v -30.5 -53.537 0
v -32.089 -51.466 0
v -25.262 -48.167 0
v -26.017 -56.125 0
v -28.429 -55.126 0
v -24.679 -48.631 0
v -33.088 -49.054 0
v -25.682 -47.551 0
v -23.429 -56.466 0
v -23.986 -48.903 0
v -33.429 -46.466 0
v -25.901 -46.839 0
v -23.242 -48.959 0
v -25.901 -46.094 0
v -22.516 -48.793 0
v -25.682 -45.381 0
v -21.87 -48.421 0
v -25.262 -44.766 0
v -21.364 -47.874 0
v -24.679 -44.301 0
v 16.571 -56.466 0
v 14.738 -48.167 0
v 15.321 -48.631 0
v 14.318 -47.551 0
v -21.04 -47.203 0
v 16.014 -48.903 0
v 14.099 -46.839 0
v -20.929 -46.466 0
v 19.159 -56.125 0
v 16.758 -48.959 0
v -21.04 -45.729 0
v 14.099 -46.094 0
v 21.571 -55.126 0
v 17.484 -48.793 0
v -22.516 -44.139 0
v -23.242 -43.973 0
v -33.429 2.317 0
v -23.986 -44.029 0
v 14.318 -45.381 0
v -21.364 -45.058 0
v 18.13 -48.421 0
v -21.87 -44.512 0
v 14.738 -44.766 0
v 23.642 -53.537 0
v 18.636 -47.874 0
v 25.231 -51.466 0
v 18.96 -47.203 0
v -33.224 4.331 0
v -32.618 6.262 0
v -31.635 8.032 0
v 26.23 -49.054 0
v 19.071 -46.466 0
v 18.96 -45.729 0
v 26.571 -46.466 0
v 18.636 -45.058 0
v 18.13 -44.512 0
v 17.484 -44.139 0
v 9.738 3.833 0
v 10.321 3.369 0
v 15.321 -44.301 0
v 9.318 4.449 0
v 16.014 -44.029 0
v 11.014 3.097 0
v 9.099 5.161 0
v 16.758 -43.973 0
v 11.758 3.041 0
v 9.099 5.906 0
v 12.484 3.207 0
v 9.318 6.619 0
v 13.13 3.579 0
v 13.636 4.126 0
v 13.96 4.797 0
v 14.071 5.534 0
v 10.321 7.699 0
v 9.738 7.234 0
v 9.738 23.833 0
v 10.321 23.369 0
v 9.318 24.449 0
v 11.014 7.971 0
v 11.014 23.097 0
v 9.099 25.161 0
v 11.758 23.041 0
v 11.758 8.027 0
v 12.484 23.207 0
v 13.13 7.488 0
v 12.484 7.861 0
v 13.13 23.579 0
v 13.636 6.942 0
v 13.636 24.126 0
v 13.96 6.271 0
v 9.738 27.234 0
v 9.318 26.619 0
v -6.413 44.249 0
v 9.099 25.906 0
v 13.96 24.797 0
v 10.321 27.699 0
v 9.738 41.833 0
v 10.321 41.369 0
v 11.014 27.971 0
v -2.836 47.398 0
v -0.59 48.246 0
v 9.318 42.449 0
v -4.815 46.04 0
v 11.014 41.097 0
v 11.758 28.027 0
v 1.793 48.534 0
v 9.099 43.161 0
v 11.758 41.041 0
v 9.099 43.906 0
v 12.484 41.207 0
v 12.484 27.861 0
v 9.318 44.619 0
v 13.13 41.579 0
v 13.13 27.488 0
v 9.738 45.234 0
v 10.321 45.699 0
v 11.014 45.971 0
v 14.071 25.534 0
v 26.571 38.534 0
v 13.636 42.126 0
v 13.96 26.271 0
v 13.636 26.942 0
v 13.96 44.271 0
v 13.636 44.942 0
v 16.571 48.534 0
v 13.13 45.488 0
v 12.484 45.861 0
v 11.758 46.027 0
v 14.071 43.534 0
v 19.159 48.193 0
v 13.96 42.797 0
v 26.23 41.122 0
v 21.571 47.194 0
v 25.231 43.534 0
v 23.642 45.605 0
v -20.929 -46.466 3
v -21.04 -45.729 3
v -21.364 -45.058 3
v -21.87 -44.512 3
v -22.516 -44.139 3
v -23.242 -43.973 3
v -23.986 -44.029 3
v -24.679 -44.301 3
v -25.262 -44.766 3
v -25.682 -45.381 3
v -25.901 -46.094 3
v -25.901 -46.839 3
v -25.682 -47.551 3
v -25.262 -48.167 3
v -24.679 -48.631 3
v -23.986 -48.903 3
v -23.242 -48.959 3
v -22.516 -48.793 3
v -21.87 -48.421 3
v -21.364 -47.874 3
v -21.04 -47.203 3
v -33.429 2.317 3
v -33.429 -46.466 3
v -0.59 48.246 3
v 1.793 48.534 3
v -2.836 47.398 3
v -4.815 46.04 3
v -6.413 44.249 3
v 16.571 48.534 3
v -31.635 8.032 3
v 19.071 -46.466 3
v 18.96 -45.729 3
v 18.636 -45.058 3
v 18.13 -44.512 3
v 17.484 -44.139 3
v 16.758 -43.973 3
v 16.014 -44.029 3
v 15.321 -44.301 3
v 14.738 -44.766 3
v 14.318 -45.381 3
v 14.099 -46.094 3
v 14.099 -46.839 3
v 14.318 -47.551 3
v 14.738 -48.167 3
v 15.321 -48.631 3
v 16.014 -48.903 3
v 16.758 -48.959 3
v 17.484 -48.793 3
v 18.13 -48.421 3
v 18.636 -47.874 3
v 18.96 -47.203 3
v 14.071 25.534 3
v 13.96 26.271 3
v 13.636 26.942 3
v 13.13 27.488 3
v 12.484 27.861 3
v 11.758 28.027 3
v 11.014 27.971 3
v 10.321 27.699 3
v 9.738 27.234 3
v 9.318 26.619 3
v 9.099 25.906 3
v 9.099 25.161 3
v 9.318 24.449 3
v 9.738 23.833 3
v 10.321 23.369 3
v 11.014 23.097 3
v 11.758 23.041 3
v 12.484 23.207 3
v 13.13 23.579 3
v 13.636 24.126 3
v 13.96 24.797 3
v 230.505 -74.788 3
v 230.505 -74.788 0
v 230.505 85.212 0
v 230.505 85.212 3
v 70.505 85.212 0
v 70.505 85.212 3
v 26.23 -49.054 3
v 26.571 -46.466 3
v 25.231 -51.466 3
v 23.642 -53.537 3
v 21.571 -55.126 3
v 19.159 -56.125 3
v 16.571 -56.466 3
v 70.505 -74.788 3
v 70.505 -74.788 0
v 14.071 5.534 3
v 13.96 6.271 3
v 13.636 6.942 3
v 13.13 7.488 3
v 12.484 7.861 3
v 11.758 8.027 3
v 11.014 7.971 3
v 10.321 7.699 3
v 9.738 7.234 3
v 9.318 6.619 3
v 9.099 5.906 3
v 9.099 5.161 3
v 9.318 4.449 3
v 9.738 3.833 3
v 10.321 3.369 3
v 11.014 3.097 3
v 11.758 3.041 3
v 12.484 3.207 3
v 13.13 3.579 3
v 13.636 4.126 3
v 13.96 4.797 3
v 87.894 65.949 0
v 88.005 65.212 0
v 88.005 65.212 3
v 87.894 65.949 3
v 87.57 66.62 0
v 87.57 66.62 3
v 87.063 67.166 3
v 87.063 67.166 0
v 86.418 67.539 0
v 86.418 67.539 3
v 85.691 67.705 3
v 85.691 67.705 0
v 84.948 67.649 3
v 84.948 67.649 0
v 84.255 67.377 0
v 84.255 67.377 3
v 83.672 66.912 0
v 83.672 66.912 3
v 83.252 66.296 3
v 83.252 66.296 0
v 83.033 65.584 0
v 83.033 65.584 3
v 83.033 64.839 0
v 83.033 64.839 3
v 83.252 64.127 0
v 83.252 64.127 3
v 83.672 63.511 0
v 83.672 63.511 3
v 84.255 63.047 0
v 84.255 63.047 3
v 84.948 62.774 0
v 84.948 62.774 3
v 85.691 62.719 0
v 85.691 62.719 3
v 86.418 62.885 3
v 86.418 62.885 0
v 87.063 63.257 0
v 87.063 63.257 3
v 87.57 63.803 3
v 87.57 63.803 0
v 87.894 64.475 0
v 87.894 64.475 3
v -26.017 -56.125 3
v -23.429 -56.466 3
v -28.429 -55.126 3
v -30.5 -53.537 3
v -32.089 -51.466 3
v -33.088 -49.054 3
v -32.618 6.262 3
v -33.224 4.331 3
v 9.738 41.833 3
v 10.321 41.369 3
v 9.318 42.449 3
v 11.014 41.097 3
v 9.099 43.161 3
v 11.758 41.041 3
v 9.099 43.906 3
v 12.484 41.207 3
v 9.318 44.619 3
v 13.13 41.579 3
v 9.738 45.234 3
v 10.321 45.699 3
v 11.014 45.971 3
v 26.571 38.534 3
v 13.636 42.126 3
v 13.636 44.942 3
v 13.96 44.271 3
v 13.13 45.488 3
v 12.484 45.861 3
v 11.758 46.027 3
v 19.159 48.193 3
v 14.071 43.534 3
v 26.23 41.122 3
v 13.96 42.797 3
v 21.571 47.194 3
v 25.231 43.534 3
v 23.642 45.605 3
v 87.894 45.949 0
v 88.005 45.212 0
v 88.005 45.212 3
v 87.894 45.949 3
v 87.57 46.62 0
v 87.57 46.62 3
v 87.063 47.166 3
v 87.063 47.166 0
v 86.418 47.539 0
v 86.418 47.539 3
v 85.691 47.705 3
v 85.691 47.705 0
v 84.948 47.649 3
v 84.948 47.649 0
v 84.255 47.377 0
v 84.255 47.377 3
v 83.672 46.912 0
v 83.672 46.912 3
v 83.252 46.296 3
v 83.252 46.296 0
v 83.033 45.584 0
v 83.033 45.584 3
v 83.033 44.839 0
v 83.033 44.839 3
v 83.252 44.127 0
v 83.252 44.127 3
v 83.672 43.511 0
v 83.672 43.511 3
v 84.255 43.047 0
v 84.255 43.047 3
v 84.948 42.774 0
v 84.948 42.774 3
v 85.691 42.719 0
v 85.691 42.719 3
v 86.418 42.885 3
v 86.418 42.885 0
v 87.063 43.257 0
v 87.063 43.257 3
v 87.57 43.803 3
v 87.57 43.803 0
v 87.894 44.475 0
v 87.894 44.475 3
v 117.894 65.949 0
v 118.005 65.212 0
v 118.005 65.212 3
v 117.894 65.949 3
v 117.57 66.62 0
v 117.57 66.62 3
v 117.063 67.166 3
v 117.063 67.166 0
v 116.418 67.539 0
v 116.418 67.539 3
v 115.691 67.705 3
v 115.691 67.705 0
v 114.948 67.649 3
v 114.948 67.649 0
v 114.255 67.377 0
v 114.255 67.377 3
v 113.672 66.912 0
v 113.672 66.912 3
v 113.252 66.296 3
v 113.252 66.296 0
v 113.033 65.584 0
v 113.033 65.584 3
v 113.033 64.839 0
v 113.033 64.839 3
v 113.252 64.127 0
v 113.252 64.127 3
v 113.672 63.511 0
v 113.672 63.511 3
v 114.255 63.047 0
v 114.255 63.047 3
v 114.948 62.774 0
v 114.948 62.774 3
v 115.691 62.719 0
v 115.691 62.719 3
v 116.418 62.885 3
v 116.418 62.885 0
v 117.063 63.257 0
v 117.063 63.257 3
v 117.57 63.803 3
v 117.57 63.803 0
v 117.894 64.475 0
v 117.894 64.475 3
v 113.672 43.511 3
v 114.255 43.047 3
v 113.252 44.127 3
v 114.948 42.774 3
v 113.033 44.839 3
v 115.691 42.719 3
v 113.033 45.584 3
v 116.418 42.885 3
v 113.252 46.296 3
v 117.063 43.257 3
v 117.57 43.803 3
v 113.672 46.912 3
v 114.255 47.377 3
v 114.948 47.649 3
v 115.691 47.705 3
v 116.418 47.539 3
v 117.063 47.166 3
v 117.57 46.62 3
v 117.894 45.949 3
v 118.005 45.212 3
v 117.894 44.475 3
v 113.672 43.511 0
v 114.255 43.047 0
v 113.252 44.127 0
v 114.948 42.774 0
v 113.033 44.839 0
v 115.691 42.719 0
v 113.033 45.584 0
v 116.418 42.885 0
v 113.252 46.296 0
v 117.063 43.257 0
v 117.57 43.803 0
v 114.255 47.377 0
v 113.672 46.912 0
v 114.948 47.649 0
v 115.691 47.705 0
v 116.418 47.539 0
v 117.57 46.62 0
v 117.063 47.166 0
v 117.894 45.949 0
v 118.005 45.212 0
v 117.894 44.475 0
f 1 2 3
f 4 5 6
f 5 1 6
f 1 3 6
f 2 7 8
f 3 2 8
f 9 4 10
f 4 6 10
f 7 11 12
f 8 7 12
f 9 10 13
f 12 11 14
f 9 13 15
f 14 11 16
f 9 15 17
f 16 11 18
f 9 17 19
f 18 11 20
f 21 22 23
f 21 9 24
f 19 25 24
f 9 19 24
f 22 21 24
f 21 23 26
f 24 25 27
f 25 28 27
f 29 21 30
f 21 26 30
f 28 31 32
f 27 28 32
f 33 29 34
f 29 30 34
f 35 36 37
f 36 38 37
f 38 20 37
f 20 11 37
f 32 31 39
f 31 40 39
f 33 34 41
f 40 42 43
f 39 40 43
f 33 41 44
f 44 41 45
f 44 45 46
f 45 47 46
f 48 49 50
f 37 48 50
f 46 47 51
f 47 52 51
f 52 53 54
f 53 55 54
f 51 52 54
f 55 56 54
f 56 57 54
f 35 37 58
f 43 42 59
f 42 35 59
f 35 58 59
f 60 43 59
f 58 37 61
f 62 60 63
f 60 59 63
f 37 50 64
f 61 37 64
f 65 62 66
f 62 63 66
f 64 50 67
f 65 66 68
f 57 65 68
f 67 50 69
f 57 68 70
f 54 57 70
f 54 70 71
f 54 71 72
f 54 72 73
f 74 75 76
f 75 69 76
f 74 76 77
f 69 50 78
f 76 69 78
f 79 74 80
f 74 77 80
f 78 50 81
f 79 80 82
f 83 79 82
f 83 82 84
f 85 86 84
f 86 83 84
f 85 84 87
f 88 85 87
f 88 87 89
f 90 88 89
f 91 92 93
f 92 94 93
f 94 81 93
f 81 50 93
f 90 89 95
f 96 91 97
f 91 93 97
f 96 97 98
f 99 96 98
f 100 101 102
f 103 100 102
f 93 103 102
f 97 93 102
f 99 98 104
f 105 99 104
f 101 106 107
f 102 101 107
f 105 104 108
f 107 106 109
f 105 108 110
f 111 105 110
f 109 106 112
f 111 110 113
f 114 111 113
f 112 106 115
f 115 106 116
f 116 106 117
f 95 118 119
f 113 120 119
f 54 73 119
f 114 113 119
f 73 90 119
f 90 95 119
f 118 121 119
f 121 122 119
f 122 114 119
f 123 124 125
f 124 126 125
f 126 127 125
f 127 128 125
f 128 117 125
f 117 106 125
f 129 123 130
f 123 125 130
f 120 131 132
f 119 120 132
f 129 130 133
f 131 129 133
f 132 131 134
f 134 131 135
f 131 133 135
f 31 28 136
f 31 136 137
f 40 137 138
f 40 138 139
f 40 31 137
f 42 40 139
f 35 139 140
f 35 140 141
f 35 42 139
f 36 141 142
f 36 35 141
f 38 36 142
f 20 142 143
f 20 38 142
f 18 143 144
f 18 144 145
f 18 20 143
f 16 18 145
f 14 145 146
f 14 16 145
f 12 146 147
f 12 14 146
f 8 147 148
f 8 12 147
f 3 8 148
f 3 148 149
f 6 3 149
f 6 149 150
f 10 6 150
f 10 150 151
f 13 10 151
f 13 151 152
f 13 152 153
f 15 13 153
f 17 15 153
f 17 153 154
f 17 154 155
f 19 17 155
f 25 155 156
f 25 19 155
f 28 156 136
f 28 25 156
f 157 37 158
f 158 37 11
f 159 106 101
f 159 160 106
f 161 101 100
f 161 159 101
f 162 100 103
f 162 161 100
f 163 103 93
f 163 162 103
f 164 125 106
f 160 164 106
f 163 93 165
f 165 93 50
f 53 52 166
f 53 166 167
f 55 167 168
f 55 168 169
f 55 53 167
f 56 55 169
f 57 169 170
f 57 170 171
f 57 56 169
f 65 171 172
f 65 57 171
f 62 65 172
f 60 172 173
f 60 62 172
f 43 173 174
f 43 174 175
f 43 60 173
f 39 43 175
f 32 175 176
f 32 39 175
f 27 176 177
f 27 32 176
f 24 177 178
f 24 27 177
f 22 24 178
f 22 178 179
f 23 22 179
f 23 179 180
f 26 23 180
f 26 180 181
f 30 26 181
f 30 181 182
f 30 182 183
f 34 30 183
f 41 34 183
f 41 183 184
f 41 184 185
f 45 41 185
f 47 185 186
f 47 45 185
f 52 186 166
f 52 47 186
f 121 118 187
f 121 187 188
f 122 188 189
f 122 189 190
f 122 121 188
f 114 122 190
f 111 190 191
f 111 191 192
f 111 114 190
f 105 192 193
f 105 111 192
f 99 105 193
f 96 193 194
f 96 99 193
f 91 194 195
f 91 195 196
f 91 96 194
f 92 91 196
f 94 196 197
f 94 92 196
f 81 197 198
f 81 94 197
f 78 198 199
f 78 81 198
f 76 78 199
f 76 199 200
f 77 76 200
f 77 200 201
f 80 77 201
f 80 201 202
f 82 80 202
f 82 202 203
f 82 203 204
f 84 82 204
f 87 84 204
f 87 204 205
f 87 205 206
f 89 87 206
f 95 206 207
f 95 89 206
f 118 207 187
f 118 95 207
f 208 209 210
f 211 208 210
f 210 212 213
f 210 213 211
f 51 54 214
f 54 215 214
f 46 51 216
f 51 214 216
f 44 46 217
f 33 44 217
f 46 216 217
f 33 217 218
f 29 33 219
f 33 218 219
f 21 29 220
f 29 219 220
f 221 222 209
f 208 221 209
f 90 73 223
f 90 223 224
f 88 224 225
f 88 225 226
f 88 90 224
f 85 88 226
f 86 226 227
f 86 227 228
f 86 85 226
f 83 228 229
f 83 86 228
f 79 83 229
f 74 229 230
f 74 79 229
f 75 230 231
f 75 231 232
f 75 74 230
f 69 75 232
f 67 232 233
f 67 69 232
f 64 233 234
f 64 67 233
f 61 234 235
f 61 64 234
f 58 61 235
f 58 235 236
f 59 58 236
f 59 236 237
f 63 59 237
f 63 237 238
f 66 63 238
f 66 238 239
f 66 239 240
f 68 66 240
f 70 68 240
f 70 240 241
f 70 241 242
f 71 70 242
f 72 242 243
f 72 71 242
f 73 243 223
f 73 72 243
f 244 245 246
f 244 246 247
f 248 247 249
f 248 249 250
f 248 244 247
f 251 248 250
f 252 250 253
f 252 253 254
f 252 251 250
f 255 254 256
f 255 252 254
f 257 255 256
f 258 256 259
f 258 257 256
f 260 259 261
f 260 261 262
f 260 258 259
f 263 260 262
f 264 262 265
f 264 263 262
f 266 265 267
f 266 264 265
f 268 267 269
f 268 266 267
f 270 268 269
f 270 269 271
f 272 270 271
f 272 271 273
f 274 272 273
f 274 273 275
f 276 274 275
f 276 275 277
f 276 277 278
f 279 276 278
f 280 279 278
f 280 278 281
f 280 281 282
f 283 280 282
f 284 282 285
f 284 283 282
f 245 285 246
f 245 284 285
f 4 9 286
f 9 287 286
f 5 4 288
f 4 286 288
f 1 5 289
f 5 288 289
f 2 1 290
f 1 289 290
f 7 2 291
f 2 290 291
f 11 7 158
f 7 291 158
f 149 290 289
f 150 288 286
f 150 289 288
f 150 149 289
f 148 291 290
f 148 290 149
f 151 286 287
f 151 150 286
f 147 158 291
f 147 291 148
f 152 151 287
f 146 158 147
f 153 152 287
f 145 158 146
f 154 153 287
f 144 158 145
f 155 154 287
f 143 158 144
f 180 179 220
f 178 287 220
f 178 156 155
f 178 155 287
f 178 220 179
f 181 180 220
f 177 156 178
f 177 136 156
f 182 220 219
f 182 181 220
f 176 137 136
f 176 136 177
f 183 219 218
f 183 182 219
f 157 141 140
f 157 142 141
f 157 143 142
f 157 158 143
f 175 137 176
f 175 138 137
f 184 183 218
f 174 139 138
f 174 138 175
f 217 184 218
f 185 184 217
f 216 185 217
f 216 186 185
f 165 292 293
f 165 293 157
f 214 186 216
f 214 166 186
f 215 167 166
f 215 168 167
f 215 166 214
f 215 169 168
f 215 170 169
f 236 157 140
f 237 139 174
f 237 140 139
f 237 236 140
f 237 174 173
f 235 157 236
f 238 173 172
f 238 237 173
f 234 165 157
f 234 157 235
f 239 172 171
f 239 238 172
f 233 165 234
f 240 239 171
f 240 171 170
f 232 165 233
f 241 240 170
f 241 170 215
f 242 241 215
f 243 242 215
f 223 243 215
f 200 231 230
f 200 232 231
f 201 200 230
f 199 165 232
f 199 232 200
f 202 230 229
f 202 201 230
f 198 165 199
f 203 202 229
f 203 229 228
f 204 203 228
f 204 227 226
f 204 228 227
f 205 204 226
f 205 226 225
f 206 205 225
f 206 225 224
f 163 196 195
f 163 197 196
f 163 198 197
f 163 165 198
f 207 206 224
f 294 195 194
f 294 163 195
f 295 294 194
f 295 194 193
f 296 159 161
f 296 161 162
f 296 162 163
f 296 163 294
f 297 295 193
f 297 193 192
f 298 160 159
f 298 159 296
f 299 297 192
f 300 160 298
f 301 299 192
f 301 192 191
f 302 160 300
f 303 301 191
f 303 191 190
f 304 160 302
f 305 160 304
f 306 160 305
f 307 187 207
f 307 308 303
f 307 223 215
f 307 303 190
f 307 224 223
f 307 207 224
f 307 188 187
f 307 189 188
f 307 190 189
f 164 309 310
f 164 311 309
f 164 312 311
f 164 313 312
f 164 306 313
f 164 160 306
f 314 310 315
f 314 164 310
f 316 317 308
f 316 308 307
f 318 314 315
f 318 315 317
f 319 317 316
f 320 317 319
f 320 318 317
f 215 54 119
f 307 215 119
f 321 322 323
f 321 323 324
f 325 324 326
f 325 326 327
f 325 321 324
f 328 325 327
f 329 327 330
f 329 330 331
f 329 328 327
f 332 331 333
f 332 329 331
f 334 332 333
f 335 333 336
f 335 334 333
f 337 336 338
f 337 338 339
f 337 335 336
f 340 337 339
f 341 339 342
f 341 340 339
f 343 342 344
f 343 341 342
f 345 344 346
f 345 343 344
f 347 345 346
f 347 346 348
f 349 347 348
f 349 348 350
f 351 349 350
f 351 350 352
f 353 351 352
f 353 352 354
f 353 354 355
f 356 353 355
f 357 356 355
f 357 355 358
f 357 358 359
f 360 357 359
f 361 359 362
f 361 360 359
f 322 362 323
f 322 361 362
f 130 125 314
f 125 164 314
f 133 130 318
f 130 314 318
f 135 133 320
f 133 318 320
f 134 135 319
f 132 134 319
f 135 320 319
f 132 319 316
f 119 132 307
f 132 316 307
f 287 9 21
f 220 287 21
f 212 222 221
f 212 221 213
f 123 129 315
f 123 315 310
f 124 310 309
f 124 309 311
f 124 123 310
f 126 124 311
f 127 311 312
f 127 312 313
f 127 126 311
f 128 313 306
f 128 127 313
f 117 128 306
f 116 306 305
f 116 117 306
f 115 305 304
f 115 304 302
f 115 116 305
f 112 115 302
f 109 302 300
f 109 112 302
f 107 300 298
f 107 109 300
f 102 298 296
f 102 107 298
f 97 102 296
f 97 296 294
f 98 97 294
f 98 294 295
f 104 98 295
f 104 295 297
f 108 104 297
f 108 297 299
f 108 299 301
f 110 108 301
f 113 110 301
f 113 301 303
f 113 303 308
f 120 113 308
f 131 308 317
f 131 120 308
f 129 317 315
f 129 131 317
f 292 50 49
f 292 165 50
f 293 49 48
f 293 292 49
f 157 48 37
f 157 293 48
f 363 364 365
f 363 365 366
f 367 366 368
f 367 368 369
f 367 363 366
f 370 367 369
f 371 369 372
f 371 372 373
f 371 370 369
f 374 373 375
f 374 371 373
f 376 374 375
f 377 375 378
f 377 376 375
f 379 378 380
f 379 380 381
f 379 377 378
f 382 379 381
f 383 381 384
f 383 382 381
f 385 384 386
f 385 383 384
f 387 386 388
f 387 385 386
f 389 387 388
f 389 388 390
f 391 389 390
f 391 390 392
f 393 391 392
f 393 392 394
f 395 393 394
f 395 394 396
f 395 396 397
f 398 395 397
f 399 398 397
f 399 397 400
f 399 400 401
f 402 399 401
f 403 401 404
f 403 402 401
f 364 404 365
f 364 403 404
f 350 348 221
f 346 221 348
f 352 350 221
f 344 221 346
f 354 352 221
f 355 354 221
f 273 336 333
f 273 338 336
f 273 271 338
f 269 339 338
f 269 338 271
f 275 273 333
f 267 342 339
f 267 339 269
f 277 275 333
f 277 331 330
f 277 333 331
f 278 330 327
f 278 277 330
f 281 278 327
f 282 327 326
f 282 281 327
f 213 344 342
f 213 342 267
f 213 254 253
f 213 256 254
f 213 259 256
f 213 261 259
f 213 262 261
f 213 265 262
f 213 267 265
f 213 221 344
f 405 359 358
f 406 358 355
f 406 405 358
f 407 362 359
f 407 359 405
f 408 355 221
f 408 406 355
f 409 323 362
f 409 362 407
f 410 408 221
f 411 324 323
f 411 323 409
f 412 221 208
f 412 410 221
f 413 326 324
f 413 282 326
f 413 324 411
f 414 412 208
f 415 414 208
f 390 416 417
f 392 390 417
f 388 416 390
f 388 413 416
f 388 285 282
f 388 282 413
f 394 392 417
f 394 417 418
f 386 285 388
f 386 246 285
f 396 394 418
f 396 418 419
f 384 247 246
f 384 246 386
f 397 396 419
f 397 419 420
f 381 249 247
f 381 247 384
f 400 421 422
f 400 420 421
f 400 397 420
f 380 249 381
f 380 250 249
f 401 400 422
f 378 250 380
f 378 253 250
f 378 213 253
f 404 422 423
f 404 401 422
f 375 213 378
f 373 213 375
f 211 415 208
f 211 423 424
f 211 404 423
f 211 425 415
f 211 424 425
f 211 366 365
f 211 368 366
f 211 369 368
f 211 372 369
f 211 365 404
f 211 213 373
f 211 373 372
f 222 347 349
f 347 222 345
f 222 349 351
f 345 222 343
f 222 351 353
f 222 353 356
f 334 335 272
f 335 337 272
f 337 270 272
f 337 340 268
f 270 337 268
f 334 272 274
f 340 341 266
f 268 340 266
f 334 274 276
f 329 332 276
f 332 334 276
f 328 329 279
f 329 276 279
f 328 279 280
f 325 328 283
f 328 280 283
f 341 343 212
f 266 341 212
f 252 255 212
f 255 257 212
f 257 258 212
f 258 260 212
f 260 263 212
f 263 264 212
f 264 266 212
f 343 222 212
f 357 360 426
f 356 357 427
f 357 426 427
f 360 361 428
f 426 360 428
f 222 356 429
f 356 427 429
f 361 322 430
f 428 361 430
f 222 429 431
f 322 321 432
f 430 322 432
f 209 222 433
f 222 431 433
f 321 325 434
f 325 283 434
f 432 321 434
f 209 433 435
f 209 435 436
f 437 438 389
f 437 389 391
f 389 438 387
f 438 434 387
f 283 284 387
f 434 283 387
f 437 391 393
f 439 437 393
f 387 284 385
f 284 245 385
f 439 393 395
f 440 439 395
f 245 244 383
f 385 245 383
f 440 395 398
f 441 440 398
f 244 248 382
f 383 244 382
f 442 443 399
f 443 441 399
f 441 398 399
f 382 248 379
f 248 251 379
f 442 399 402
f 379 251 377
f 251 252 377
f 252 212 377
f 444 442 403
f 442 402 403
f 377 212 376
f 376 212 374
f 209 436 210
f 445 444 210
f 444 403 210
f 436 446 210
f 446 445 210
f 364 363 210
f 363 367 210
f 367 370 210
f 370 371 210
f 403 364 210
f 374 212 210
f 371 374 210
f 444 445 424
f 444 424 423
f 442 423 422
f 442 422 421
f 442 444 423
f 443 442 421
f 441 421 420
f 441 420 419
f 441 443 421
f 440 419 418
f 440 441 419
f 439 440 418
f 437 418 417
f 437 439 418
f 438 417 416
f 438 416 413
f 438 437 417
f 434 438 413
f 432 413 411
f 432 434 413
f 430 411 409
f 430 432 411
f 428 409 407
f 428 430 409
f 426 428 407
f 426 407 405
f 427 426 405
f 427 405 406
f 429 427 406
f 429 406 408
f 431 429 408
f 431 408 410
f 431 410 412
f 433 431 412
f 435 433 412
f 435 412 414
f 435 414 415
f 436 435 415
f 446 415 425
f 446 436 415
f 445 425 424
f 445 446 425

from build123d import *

# Parameters (mm, degrees)
F0_R     = 2.5
F1_DEPTH = 3
F2_R     = 10
F3_W     = 160
F3_H     = 160
F3_R     = 2.5
F4_DEPTH = 3


with BuildPart() as f1:
    # F0 (on Top) → F1 (new body)
    with BuildSketch(Plane.XY):
        Polygon((26.57078, 48.533842), (-3.42922, 48.533842), (-33.42922, 5.455991), (-33.42922, -56.466158), (26.57078, -56.466158), align=None)
        with Locations((-23.42922, -46.466158)):
            Circle(F0_R, mode=Mode.SUBTRACT)
        with Locations((16.57078, -46.466158)):
            Circle(F0_R, mode=Mode.SUBTRACT)
        with Locations((11.57078, 5.533842)):
            Circle(F0_R, mode=Mode.SUBTRACT)
        with Locations((11.57078, 25.533842)):
            Circle(F0_R, mode=Mode.SUBTRACT)
        with Locations((11.57078, 43.533842)):
            Circle(F0_R, mode=Mode.SUBTRACT)
    extrude(amount=F1_DEPTH)

    # F2
    f2_edges = [f1.edges().sort_by_distance(p)[0] for p in [
        (26.57078, 48.533842, 1.5),
        (-3.42922, 48.533842, 1.5),
        (26.57078, -56.466158, 1.5),
        (-33.42922, -56.466158, 1.5),
        (-33.42922, 5.455991, 1.5),
    ]]
    fillet(f2_edges, radius=F2_R)


with BuildPart() as f4:
    # F3 (on Top) → F4 (new body)
    with BuildSketch(Plane.XY):
        with Locations((150.504651, 5.21178)):
            Rectangle(F3_W, F3_H)
        with Locations((115.504651, 45.21178)):
            Circle(F3_R, mode=Mode.SUBTRACT)
        with Locations((85.504651, 45.21178)):
            Circle(F3_R, mode=Mode.SUBTRACT)
        with Locations((85.504651, 65.21178)):
            Circle(F3_R, mode=Mode.SUBTRACT)
        with Locations((115.504651, 65.21178)):
            Circle(F3_R, mode=Mode.SUBTRACT)
    extrude(amount=F4_DEPTH)


solid = Compound([f1.part, f4.part])
